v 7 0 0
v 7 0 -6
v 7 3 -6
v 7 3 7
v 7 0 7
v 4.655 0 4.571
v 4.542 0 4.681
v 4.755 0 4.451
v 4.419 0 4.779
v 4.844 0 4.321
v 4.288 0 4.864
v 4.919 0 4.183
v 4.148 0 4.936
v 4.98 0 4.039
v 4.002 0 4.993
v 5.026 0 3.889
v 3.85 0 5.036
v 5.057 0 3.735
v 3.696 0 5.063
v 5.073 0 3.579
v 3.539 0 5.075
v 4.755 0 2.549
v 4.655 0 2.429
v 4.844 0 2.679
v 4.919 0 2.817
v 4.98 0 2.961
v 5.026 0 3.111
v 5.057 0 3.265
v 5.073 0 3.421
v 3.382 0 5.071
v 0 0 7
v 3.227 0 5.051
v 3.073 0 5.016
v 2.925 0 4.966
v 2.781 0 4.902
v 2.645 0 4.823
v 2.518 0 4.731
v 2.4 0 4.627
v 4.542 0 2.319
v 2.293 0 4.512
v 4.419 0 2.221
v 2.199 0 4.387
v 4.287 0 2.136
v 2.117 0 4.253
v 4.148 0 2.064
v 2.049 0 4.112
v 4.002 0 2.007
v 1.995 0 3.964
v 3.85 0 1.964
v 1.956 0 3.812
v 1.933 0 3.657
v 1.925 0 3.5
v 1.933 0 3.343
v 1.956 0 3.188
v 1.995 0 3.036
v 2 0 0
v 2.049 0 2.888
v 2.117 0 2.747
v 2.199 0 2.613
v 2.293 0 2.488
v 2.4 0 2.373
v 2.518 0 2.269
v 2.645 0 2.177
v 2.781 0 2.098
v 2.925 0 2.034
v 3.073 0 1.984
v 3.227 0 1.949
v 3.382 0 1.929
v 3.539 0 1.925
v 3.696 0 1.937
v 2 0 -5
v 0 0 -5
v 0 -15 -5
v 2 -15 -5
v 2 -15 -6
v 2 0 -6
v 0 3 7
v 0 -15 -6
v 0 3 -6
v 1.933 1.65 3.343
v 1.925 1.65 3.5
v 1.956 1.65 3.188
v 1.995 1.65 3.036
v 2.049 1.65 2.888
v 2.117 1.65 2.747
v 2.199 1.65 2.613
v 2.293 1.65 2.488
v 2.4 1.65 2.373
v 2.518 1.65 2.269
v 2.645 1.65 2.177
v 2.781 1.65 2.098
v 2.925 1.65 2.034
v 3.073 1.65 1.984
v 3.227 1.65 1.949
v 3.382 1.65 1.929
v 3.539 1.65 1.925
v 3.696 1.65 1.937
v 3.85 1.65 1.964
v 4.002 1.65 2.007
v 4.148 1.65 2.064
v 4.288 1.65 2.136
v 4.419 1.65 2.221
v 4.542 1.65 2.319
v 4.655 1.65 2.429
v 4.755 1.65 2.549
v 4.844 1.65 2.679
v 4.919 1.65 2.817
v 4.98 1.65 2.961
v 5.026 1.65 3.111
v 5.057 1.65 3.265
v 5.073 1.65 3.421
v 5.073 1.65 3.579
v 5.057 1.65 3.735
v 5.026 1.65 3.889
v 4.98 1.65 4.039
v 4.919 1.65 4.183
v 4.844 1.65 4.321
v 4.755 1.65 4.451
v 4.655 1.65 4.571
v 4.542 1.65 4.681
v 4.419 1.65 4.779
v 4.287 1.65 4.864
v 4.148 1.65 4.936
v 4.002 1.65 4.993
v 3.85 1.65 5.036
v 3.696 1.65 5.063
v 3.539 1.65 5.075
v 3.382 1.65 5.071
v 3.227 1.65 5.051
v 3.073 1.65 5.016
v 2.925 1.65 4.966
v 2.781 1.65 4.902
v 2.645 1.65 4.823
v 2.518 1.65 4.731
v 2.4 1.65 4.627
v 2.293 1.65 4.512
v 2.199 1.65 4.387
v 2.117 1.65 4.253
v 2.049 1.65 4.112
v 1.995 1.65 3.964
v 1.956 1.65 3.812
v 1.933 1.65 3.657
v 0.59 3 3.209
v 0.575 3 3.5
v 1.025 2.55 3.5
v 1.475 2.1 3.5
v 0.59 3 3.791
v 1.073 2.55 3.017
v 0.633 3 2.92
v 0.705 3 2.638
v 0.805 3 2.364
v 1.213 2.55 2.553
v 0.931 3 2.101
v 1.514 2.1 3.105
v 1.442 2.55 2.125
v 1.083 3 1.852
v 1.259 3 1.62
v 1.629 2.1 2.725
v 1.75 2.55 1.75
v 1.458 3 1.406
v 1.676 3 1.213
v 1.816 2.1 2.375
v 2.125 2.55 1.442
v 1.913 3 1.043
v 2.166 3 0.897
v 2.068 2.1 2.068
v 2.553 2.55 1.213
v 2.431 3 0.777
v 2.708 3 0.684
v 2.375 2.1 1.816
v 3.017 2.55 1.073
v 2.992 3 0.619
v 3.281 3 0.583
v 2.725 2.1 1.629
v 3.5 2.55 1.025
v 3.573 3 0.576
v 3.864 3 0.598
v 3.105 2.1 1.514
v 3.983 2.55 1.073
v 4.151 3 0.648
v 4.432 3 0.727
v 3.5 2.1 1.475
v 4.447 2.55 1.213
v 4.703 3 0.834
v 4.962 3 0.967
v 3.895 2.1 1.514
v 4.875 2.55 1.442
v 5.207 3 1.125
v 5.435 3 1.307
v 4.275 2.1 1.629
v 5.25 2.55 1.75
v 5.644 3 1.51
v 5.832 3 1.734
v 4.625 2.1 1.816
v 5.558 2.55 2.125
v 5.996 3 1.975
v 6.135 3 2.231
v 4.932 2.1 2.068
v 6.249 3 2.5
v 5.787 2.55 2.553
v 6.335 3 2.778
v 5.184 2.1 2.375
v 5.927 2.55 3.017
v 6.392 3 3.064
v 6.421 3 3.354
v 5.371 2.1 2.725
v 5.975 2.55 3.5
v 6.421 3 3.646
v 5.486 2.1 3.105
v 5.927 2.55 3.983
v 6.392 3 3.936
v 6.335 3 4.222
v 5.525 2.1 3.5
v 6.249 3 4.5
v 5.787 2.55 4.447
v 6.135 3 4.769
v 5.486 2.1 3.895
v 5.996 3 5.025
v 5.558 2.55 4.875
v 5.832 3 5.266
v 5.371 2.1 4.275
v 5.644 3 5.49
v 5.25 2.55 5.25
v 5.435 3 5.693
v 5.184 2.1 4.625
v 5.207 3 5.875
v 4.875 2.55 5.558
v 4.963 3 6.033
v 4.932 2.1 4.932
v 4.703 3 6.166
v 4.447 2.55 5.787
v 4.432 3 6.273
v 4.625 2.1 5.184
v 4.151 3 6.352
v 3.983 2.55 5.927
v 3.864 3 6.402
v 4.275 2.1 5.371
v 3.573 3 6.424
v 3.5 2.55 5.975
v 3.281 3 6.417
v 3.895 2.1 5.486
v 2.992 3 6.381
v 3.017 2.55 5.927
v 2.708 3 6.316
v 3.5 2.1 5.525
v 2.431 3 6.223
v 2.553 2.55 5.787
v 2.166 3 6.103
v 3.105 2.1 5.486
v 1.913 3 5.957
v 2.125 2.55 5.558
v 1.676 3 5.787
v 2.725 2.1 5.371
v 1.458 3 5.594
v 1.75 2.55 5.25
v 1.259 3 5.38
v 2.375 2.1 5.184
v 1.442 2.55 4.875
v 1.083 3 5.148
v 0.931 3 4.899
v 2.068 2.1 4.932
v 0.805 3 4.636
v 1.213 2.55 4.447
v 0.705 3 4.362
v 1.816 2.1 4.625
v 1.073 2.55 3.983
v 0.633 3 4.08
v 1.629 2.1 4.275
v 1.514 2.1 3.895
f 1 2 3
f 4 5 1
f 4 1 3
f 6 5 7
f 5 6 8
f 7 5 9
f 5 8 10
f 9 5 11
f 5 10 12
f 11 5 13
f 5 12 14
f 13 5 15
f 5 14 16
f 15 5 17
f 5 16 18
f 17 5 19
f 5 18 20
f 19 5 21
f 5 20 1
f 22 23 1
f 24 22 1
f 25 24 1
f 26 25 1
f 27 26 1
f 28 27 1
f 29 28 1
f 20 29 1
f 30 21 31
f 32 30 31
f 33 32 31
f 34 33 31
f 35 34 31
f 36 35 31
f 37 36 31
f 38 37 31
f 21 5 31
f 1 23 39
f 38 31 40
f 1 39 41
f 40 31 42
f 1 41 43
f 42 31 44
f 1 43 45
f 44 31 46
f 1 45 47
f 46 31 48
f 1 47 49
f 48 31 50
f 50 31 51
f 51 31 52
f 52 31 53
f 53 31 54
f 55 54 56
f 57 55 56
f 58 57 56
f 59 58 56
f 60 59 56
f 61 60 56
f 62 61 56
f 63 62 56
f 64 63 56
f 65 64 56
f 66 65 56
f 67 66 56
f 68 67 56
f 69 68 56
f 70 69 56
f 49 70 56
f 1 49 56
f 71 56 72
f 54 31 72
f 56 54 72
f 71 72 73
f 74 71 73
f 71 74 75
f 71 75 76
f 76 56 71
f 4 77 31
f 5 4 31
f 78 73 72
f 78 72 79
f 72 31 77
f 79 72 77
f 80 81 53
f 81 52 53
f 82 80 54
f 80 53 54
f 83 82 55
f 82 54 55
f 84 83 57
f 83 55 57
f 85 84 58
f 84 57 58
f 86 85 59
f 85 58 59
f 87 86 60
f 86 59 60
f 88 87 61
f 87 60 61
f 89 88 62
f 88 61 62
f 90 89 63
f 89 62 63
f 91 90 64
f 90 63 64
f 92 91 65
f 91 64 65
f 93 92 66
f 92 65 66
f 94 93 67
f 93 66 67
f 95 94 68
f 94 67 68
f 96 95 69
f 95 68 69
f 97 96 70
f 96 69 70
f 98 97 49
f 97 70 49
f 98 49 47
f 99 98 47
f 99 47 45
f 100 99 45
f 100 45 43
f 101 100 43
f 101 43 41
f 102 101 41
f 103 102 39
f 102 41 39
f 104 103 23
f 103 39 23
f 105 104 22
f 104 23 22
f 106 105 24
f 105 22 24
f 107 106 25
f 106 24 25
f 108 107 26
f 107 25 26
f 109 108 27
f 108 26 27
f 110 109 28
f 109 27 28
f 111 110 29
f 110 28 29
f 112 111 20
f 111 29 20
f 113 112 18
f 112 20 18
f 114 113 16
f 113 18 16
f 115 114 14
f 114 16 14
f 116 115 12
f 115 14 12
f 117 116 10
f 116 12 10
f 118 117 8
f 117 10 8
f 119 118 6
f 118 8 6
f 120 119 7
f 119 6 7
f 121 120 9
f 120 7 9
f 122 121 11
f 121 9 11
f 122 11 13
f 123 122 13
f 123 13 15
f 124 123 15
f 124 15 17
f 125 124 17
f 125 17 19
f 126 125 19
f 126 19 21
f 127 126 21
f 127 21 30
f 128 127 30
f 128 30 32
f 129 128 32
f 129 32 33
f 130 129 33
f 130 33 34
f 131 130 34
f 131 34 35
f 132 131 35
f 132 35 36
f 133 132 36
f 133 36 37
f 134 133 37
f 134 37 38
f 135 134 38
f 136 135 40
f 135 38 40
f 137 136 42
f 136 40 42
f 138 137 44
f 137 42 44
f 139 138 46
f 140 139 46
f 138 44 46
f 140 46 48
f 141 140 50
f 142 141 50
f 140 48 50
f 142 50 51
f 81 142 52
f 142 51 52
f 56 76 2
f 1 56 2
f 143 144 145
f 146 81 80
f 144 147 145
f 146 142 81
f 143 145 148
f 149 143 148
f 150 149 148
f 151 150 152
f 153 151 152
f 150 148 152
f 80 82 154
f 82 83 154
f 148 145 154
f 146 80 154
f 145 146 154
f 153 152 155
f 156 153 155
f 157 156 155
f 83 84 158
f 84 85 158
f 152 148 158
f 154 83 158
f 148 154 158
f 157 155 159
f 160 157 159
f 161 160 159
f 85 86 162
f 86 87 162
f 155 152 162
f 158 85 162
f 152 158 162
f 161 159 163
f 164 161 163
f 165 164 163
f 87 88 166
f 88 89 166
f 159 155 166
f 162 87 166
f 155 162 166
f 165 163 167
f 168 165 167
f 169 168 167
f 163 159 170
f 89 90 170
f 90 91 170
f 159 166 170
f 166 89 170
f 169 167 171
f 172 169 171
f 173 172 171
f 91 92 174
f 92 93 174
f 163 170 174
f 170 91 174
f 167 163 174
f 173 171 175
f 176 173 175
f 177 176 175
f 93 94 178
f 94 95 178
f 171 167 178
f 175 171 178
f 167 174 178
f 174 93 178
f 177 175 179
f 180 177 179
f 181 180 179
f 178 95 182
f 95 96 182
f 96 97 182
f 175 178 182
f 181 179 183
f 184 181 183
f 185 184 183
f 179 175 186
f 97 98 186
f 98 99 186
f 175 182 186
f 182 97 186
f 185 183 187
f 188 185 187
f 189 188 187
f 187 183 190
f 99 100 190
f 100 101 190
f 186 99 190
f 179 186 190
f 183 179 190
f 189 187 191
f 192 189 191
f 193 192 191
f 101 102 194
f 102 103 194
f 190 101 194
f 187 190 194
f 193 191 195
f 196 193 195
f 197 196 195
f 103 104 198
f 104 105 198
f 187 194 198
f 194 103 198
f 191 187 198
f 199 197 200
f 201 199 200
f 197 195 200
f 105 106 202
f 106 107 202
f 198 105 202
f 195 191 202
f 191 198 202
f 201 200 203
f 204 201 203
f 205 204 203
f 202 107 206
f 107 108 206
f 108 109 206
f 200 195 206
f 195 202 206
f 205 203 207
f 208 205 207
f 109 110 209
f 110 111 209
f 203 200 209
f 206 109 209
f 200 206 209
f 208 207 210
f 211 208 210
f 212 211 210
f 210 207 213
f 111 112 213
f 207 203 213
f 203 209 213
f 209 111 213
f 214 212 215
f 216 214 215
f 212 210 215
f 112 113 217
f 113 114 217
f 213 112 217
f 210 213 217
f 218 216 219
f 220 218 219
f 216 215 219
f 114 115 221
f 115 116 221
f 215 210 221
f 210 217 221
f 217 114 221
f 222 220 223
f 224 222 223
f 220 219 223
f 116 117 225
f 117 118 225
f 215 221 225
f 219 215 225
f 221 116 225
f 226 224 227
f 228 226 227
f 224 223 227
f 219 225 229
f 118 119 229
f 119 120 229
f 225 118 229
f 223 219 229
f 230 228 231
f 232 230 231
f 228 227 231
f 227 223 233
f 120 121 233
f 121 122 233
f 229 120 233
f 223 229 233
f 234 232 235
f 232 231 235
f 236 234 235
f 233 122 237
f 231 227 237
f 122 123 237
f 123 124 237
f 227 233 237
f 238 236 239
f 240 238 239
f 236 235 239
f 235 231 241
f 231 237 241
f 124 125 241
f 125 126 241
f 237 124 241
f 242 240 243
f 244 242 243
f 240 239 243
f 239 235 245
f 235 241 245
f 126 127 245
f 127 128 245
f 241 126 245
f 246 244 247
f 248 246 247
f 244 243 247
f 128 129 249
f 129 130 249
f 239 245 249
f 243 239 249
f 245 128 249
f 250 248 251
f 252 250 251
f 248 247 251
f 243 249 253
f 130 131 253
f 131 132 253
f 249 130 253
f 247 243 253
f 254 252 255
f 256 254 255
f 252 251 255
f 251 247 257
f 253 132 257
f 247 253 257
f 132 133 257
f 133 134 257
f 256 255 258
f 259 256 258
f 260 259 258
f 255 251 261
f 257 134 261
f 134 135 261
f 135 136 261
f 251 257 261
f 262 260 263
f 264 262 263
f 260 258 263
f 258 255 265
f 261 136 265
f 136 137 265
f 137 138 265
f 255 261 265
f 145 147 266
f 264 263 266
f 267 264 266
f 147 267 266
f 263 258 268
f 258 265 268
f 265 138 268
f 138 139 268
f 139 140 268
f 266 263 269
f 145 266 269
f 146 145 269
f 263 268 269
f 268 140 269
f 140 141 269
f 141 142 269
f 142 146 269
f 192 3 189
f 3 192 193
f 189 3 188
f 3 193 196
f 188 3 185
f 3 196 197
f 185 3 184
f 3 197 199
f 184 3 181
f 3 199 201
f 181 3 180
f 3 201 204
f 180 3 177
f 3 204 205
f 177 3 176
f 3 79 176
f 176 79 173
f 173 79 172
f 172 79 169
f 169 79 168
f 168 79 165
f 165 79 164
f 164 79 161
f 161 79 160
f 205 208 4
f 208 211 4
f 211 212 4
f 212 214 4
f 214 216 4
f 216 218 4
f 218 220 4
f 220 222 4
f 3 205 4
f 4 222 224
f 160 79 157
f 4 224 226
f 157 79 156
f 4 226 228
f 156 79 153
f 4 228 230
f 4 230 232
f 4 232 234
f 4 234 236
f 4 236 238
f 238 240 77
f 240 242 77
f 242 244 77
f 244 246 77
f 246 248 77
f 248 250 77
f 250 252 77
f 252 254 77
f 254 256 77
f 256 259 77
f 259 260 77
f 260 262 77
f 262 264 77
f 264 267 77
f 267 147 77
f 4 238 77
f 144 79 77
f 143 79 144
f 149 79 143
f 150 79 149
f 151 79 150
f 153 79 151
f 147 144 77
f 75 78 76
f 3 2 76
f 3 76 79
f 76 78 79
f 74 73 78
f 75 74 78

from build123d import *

# Parameters (mm, degrees)
PAD_DEPTH        = 7
SKETCH001_W      = 12.044716
SKETCH001_H      = 19.424721
POCKET_DEPTH     = 6.001
HOLE_D           = 3.15
HOLE_CSINK_D     = 5.85
HOLE_CSINK_ANGLE = 90


with BuildPart() as part:
    # Sketch → Pad (new body)
    with BuildSketch(Plane.YZ):
        Polygon((0, 7), (0, -5), (-15, -5), (-15, -6), (3, -6), (3, 7), align=None)
    extrude(amount=PAD_DEPTH)

    # Sketch001 → Pocket (cut, through all)
    with BuildSketch(Plane.XY):
        with Locations((8.022358, -9.71236)):
            Rectangle(SKETCH001_W, SKETCH001_H)
    extrude(amount=-POCKET_DEPTH, mode=Mode.SUBTRACT)

    # Hole (through all)
    with Locations(Plane(origin=(0, 3, 0), x_dir=(1, 0, 0), z_dir=(0, 1, 0))):
        with Locations((3.5, -3.5)):
            CounterSinkHole(HOLE_D / 2, HOLE_CSINK_D / 2, counter_sink_angle=HOLE_CSINK_ANGLE)


solid = part.part
